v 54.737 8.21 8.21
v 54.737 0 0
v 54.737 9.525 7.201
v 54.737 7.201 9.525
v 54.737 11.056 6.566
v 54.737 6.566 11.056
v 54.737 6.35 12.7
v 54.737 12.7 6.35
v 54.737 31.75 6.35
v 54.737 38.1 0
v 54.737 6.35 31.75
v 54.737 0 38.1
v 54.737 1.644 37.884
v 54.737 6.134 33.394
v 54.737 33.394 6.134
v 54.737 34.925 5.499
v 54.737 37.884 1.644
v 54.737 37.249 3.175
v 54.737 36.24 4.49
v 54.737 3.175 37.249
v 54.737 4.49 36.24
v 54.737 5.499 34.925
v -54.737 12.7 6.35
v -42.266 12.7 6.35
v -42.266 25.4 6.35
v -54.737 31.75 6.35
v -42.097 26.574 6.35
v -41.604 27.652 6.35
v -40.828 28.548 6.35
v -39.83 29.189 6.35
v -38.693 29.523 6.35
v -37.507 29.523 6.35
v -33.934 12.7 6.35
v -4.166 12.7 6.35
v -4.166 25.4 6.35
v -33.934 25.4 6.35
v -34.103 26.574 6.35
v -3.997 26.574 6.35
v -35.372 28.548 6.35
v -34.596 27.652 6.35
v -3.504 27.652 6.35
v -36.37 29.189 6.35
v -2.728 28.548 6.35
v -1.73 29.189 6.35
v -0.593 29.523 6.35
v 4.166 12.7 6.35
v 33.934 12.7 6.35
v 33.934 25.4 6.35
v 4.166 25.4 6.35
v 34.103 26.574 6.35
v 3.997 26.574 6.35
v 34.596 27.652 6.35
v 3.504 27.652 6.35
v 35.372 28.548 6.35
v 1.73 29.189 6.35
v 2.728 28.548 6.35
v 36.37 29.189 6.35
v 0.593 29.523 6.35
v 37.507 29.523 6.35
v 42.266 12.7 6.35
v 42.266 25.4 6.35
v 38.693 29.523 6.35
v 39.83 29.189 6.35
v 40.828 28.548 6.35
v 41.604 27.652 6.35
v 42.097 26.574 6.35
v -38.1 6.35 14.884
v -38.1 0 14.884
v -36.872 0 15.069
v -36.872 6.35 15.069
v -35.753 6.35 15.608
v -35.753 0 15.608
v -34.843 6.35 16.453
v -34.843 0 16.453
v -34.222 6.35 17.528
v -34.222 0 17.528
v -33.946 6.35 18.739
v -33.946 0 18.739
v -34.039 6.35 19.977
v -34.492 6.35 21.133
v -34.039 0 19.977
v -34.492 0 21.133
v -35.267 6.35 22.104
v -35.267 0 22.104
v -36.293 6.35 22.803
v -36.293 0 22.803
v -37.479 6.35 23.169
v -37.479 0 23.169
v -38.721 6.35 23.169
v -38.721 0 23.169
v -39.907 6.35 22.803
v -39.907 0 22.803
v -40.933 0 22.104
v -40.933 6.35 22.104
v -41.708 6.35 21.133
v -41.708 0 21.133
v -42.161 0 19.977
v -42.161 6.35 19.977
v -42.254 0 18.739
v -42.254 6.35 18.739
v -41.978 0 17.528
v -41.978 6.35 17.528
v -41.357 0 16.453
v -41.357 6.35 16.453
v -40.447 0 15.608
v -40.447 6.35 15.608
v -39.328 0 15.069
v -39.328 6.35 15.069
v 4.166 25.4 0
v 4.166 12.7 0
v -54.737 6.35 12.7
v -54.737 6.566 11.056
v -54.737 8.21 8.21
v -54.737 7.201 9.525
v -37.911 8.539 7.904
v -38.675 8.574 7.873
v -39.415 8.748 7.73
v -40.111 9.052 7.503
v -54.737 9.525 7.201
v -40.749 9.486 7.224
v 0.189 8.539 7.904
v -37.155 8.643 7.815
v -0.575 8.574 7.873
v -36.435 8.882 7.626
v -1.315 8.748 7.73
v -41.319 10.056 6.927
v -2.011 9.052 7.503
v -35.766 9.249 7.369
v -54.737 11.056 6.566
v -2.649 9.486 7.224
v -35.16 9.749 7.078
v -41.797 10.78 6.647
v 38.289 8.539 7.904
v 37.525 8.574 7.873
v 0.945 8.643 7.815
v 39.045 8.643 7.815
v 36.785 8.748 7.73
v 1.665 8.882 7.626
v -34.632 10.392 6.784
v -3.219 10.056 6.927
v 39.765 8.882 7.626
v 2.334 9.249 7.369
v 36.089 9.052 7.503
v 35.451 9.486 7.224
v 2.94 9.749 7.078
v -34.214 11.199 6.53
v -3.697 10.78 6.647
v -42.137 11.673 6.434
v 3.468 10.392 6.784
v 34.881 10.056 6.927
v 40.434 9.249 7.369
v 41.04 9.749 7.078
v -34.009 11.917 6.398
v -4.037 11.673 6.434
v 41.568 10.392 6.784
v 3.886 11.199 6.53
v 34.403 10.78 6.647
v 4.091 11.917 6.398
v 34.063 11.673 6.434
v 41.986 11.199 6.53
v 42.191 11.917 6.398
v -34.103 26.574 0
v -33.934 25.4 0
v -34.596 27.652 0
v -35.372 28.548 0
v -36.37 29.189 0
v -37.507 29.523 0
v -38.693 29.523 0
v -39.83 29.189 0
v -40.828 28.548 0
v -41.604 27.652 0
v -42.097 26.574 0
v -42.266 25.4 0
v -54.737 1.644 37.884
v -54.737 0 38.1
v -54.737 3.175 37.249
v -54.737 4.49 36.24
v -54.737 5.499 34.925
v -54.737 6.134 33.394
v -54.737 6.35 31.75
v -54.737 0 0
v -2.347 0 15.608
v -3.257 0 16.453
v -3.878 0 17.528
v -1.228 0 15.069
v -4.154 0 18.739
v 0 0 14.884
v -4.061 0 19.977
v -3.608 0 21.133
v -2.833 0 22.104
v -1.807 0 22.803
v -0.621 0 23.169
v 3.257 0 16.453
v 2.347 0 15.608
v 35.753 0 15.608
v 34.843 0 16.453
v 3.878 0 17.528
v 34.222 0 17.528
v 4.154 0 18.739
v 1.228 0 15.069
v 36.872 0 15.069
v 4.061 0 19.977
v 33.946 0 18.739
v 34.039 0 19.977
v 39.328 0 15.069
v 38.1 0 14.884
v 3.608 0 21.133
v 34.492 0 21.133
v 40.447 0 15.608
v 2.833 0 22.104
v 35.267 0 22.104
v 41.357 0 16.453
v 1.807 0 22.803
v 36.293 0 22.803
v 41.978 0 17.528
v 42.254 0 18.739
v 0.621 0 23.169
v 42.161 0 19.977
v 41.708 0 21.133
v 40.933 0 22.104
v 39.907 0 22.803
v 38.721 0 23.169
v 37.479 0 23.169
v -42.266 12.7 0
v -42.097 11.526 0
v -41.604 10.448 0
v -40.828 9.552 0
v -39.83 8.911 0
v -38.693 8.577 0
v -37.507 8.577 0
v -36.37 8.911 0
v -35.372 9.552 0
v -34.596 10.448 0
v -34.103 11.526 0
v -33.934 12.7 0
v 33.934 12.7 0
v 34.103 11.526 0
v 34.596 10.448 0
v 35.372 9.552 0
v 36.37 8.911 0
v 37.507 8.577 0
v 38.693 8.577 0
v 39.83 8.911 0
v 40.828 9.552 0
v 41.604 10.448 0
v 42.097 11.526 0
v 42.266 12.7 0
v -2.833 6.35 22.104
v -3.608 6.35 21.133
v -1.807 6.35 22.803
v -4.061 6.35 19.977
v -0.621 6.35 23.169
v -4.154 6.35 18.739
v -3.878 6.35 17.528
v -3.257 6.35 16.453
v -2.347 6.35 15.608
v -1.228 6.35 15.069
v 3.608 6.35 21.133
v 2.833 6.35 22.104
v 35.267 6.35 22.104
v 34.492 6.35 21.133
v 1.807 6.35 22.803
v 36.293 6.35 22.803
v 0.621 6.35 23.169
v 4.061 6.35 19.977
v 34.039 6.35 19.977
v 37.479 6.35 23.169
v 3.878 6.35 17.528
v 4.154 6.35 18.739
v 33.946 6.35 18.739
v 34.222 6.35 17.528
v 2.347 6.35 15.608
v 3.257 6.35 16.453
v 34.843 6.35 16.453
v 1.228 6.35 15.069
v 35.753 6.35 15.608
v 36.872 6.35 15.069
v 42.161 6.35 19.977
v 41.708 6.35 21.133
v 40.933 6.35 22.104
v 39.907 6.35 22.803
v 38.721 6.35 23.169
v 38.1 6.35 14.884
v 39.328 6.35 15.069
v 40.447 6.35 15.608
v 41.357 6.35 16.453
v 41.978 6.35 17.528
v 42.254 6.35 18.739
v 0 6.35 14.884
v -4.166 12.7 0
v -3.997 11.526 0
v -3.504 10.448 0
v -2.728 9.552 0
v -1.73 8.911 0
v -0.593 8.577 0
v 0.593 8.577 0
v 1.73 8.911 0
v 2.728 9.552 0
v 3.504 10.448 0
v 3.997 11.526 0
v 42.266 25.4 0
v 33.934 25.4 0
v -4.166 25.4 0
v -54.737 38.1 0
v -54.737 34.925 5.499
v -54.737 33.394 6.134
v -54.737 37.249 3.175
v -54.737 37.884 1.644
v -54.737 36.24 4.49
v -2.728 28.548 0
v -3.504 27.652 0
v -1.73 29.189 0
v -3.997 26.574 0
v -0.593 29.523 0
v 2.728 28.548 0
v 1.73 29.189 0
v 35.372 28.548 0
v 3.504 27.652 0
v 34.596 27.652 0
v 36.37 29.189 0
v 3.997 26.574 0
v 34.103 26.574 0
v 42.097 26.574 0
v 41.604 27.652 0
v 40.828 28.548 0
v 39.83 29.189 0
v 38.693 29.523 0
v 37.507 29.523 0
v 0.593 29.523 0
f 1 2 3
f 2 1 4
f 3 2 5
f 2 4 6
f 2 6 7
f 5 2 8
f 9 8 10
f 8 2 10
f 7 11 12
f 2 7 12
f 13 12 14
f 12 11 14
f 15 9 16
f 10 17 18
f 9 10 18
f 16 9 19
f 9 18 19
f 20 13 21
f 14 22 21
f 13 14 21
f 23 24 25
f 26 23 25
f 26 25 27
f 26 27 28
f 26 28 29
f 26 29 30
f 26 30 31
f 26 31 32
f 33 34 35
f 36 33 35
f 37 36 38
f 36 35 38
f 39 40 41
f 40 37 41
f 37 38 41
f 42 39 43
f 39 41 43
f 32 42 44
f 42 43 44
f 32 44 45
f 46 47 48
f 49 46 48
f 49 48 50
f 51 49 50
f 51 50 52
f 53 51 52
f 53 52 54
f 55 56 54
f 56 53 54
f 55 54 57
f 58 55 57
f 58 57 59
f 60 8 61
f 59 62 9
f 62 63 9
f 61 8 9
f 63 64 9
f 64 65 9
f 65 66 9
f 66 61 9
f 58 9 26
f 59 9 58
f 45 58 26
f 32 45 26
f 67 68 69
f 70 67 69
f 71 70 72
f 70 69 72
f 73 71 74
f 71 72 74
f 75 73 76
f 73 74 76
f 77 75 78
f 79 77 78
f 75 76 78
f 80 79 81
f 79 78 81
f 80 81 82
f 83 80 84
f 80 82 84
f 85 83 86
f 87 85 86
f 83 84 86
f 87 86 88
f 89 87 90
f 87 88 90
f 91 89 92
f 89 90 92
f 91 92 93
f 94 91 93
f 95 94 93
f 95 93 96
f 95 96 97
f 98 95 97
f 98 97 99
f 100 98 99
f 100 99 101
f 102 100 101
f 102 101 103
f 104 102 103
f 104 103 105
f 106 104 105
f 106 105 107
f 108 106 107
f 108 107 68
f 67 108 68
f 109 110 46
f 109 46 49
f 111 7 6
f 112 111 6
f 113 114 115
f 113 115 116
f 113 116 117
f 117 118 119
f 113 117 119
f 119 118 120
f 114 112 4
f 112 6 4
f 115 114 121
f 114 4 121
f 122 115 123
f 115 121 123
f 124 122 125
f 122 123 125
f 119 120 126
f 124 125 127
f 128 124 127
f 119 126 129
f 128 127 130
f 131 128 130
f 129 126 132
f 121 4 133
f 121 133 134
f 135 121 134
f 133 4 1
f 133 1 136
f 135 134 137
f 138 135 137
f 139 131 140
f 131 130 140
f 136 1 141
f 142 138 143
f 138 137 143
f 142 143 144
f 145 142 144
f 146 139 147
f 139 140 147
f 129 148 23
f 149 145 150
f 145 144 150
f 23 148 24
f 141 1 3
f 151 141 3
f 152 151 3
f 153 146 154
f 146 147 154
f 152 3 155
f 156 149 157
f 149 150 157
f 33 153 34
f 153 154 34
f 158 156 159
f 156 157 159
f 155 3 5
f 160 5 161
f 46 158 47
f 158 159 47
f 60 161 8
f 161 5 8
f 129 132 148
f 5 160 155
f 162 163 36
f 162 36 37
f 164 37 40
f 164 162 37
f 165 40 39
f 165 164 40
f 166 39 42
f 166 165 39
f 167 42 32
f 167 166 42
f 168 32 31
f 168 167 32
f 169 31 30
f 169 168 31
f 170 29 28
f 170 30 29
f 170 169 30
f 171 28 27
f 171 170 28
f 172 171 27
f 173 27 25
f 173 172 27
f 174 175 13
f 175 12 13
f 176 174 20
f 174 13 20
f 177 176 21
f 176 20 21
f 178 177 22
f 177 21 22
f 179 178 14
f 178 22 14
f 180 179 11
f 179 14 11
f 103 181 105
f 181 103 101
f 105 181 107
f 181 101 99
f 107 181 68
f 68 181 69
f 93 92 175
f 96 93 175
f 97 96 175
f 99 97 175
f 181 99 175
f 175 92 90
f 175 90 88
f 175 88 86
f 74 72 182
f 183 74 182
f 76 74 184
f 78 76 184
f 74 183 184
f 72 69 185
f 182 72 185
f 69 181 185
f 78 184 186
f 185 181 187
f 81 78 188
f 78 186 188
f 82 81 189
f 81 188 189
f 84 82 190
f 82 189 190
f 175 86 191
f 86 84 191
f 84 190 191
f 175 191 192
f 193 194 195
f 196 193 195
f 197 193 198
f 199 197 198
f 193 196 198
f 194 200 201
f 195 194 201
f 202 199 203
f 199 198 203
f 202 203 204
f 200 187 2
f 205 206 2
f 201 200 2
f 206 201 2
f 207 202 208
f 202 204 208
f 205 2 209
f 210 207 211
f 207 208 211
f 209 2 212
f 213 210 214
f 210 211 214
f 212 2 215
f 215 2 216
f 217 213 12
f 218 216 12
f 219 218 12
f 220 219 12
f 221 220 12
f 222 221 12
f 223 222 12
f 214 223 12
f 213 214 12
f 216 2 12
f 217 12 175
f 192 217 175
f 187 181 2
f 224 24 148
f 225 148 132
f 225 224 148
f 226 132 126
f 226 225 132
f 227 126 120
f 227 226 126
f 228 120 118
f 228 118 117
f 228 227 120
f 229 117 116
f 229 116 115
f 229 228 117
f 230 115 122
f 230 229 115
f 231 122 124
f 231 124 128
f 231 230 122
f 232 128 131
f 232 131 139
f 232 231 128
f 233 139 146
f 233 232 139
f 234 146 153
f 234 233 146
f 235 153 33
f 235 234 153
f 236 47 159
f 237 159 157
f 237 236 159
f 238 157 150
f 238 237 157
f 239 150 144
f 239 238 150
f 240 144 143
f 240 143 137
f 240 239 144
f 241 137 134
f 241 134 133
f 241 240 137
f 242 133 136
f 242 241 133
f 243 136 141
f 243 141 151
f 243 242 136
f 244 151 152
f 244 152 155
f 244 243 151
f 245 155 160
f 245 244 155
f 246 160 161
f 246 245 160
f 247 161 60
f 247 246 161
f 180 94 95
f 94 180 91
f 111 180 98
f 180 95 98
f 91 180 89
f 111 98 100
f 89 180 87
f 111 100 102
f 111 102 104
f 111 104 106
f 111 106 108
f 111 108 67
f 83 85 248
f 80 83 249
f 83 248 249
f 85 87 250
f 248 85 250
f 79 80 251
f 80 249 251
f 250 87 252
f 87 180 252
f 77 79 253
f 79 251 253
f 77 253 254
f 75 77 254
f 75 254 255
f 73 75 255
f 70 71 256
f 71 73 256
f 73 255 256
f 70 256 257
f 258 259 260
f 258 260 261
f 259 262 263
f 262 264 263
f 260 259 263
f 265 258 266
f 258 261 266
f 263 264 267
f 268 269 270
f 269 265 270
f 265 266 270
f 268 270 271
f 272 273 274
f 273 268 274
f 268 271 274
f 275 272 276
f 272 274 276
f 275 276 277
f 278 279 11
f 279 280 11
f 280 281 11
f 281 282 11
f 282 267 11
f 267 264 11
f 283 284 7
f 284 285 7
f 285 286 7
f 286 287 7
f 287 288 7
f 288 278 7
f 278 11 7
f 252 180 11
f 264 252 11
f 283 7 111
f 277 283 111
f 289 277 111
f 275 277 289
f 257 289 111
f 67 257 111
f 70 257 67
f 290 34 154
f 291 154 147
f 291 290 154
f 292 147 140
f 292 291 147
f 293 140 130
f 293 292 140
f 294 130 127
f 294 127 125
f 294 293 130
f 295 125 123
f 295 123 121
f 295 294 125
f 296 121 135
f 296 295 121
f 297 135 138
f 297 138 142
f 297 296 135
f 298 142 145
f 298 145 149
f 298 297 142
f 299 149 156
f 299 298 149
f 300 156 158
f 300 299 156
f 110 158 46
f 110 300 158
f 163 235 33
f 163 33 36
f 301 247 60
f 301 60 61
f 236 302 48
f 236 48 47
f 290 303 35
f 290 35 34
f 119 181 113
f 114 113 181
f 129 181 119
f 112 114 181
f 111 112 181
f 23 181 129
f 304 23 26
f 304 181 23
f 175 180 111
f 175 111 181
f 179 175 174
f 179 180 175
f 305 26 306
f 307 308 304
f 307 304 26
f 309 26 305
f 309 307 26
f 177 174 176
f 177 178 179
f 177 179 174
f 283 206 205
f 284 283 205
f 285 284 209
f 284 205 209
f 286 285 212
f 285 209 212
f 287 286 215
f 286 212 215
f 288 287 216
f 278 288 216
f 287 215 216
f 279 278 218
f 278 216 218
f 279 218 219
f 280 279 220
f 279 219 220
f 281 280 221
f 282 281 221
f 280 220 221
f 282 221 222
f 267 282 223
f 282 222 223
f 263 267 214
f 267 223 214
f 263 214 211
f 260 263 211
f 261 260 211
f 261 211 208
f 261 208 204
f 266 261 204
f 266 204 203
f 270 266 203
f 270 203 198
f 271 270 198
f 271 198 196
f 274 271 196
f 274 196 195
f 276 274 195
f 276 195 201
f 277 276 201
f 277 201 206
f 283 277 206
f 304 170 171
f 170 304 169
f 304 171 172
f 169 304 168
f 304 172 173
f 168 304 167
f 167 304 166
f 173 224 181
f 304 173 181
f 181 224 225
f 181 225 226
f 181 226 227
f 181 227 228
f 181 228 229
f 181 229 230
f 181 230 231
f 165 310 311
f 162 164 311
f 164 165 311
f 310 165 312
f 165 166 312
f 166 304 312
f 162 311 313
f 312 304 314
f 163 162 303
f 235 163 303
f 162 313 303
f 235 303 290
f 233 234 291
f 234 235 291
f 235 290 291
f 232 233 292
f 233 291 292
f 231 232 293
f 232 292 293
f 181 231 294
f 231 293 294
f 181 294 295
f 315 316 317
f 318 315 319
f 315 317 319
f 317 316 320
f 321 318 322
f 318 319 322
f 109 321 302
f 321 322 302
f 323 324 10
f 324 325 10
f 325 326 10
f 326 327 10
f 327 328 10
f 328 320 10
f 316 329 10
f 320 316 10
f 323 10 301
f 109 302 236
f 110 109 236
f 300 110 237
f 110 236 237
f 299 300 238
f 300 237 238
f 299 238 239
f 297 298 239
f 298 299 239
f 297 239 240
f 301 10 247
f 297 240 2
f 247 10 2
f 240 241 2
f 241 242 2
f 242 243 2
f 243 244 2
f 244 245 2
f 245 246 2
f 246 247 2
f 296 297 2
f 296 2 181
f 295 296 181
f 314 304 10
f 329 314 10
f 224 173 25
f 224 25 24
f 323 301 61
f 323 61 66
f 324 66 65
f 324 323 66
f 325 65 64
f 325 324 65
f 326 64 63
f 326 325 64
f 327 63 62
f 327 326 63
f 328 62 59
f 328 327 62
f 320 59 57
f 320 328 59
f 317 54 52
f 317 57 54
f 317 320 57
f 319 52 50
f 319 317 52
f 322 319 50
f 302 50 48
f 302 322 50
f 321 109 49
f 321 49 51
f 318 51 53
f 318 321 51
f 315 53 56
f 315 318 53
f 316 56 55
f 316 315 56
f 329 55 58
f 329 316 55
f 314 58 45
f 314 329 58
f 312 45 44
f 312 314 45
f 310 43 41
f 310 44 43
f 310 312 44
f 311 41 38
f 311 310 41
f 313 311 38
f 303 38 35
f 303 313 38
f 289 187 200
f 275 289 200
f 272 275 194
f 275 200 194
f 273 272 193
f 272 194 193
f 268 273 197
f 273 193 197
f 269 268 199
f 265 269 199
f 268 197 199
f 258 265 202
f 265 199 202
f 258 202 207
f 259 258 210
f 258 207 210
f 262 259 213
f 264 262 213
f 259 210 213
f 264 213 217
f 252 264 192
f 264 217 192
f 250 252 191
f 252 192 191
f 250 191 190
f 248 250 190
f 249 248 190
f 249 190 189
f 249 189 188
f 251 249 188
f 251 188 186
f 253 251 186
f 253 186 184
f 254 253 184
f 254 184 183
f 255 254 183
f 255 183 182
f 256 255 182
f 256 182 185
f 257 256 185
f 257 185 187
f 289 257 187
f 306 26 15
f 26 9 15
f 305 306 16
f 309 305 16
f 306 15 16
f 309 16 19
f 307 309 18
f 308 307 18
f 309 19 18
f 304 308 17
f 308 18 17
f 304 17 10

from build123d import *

# Parameters (mm, degrees)
BASE_EXTRUDE_DEPTH = 54.737
SKETCH2_R          = 4.1656
HOLE_DEPTH         = 77.807285911
HOLE_PATTERN_COUNT = 3
HOLE_PATTERN_PITCH = 38.1
SLOT_DEPTH         = 77.807285911
SLOT_PATTERN_COUNT = 3
SLOT_PATTERN_PITCH = 38.1


with BuildPart() as part:
    # Sketch1 → Base Extrude (new, symmetric)
    with BuildSketch(Plane(origin=(0, 0, 0), x_dir=(0, 0, -1), z_dir=(1, 0, 0))):
        with BuildLine():
            Line((-6.35, 12.7), (-6.35, 31.75))
            ThreePointArc((-6.35, 31.75), (-4.490128061, 36.240128061), (0, 38.1))
            Line((0, 38.1), (0, 0))
            Line((0, 0), (-38.1, 0))
            ThreePointArc((-38.1, 0), (-36.240128061, 4.490128061), (-31.75, 6.35))
            Line((-31.75, 6.35), (-12.7, 6.35))
            ThreePointArc((-12.7, 6.35), (-8.209871939, 8.209871939), (-6.35, 12.7))
        make_face()
    extrude(amount=BASE_EXTRUDE_DEPTH, both=True)

    # Sketch2 → Hole (cut, through all)
    with BuildSketch(Plane.XZ):
        with Locations(Location((-38.1, 19.05, 0), (0, 0, 270))):
            Circle(SKETCH2_R)
    hole = extrude(amount=-HOLE_DEPTH, mode=Mode.SUBTRACT)

    # Hole Pattern: Hole ×3
    with Locations(*[(i * HOLE_PATTERN_PITCH, 0, 0) for i in range(1, HOLE_PATTERN_COUNT)]):
        add(hole, mode=Mode.SUBTRACT)

    # Sketch3 → Slot (cut, through all)
    with BuildSketch(Plane(origin=(0, 0, 0), x_dir=(-1, 0, 0), z_dir=(0, 0, -1))):
        with BuildLine():
            Line((42.2656, 25.4), (42.2656, 12.7))
            ThreePointArc((42.2656, 12.7), (38.1, 8.5344), (33.9344, 12.7))
            Line((33.9344, 12.7), (33.9344, 25.4))
            ThreePointArc((33.9344, 25.4), (38.1, 29.5656), (42.2656, 25.4))
        make_face()
    slot = extrude(amount=-SLOT_DEPTH, mode=Mode.SUBTRACT)

    # Slot Pattern: Slot ×3
    with Locations(*[(i * SLOT_PATTERN_PITCH, 0, 0) for i in range(1, SLOT_PATTERN_COUNT)]):
        add(slot, mode=Mode.SUBTRACT)


solid = part.part
